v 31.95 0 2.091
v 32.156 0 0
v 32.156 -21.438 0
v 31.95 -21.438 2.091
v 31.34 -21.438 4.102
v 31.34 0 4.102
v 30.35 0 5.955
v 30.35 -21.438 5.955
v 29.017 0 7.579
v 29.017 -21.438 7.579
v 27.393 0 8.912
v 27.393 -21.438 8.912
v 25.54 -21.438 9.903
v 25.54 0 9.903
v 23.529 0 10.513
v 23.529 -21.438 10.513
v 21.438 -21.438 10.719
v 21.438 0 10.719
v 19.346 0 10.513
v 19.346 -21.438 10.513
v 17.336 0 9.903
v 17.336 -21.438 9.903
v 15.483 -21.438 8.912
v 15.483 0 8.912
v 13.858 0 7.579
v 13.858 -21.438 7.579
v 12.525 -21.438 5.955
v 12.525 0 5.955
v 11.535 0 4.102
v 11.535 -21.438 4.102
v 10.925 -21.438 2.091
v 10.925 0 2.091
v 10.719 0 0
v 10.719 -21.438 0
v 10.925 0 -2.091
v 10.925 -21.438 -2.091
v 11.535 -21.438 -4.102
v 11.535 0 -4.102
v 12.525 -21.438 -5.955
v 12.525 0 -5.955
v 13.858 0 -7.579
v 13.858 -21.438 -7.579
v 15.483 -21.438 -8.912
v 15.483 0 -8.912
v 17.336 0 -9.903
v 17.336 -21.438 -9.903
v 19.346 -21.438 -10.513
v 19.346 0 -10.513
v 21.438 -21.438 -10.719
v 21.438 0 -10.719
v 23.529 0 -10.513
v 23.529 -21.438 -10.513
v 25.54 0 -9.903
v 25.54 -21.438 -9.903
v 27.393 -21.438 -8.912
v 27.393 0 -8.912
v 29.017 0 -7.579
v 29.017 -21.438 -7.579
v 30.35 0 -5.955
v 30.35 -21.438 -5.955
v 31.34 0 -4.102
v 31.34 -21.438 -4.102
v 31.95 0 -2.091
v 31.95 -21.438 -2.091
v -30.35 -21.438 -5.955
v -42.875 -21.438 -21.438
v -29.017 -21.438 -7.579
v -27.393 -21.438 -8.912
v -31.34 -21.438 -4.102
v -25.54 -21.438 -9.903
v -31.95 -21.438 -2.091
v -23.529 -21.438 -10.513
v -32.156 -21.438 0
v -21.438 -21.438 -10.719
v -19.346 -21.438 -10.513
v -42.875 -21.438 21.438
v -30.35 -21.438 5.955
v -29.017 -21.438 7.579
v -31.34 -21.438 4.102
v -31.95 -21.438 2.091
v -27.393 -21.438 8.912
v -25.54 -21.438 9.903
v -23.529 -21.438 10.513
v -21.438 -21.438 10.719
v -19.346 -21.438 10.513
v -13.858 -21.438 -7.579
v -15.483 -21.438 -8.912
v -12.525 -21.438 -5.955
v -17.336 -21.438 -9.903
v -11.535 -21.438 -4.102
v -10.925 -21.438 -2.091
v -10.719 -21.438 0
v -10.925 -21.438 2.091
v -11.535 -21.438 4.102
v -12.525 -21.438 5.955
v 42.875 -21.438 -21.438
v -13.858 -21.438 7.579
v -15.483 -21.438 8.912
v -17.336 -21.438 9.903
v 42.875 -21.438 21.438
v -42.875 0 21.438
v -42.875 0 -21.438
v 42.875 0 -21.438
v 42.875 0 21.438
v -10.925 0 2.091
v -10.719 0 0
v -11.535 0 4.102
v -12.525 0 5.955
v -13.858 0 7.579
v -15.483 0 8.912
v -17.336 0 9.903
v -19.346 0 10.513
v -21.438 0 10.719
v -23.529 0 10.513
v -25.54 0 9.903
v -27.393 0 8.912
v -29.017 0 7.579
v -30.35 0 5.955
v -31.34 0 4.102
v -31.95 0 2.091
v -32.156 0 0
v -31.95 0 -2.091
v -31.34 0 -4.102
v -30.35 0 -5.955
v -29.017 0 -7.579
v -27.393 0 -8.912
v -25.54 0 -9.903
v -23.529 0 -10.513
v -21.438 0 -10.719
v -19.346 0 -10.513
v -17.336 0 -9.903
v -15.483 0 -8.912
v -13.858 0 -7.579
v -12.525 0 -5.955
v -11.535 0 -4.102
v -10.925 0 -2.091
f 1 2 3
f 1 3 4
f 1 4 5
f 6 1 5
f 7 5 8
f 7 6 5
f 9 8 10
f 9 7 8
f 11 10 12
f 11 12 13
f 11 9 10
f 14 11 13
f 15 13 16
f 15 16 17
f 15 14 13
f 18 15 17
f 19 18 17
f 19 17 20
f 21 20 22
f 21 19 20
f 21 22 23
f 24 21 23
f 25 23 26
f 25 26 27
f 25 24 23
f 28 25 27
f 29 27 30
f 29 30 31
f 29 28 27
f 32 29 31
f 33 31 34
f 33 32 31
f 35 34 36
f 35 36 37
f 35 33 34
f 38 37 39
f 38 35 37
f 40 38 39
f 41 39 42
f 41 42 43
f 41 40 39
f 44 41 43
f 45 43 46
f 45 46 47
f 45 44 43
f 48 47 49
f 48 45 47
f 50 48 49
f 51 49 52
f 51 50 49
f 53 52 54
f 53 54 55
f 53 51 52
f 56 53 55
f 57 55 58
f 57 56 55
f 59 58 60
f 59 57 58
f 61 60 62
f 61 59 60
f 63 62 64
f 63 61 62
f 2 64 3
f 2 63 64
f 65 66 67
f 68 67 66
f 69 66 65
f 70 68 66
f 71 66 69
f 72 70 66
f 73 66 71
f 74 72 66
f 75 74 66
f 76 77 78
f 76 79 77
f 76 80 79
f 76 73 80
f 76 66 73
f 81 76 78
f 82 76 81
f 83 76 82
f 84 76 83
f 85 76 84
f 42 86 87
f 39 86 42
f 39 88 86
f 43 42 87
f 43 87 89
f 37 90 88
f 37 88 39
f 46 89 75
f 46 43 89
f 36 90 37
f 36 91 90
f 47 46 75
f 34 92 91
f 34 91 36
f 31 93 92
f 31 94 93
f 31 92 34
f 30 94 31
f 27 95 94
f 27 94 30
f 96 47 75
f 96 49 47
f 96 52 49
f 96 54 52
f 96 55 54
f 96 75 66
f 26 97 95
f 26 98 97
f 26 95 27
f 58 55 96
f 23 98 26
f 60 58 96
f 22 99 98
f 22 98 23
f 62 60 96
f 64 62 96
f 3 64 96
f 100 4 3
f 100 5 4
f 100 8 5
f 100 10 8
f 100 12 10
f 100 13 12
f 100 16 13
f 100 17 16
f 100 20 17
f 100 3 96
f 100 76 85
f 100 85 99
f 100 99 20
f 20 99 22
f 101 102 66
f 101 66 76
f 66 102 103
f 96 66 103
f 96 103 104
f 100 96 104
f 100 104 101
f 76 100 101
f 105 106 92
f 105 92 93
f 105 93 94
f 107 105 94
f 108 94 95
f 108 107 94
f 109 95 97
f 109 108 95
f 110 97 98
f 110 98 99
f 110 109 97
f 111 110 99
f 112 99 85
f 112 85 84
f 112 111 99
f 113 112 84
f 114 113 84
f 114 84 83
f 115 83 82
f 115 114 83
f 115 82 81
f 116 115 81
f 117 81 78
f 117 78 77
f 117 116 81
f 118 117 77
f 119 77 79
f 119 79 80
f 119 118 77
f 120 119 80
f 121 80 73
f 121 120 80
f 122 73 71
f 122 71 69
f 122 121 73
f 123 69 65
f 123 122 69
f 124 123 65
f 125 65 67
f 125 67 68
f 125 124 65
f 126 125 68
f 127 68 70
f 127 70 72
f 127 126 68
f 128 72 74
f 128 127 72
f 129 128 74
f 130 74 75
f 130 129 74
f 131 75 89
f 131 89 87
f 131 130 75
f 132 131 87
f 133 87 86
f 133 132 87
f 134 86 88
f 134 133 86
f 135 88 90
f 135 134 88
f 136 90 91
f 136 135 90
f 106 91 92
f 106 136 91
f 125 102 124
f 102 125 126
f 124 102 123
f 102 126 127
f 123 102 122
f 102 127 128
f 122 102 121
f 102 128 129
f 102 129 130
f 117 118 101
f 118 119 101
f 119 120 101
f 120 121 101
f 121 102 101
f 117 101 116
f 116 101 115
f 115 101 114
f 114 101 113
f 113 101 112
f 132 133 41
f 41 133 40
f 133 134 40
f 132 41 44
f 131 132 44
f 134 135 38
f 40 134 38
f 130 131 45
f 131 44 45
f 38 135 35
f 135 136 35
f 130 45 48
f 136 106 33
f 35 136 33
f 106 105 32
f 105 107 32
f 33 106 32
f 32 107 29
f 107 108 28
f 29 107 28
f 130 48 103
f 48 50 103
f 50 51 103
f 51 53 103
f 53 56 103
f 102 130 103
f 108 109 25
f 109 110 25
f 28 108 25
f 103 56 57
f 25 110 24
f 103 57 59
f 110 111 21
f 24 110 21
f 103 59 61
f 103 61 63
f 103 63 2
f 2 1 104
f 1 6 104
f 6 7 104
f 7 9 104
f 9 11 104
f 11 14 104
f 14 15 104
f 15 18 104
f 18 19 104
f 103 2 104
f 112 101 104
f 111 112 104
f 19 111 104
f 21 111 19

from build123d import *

# Parameters (mm, degrees)
F0_W     = 42.8752
F0_H     = 42.8752
F0_R     = 10.7188
F1_DEPTH = 21.4376


with BuildPart() as f1:
    # F0 (on Front) → F1 (new body)
    with BuildSketch(Plane.XZ):
        with Locations((21.4376, 0)):
            Rectangle(F0_W, F0_H)
        with Locations((21.4376, 0)):
            Circle(F0_R, mode=Mode.SUBTRACT)
        with Locations((-21.4376, 0)):
            Rectangle(F0_W, F0_H)
        with Locations((-21.4376, 0)):
            Circle(F0_R, mode=Mode.SUBTRACT)
    extrude(amount=F1_DEPTH)


solid = f1.part
